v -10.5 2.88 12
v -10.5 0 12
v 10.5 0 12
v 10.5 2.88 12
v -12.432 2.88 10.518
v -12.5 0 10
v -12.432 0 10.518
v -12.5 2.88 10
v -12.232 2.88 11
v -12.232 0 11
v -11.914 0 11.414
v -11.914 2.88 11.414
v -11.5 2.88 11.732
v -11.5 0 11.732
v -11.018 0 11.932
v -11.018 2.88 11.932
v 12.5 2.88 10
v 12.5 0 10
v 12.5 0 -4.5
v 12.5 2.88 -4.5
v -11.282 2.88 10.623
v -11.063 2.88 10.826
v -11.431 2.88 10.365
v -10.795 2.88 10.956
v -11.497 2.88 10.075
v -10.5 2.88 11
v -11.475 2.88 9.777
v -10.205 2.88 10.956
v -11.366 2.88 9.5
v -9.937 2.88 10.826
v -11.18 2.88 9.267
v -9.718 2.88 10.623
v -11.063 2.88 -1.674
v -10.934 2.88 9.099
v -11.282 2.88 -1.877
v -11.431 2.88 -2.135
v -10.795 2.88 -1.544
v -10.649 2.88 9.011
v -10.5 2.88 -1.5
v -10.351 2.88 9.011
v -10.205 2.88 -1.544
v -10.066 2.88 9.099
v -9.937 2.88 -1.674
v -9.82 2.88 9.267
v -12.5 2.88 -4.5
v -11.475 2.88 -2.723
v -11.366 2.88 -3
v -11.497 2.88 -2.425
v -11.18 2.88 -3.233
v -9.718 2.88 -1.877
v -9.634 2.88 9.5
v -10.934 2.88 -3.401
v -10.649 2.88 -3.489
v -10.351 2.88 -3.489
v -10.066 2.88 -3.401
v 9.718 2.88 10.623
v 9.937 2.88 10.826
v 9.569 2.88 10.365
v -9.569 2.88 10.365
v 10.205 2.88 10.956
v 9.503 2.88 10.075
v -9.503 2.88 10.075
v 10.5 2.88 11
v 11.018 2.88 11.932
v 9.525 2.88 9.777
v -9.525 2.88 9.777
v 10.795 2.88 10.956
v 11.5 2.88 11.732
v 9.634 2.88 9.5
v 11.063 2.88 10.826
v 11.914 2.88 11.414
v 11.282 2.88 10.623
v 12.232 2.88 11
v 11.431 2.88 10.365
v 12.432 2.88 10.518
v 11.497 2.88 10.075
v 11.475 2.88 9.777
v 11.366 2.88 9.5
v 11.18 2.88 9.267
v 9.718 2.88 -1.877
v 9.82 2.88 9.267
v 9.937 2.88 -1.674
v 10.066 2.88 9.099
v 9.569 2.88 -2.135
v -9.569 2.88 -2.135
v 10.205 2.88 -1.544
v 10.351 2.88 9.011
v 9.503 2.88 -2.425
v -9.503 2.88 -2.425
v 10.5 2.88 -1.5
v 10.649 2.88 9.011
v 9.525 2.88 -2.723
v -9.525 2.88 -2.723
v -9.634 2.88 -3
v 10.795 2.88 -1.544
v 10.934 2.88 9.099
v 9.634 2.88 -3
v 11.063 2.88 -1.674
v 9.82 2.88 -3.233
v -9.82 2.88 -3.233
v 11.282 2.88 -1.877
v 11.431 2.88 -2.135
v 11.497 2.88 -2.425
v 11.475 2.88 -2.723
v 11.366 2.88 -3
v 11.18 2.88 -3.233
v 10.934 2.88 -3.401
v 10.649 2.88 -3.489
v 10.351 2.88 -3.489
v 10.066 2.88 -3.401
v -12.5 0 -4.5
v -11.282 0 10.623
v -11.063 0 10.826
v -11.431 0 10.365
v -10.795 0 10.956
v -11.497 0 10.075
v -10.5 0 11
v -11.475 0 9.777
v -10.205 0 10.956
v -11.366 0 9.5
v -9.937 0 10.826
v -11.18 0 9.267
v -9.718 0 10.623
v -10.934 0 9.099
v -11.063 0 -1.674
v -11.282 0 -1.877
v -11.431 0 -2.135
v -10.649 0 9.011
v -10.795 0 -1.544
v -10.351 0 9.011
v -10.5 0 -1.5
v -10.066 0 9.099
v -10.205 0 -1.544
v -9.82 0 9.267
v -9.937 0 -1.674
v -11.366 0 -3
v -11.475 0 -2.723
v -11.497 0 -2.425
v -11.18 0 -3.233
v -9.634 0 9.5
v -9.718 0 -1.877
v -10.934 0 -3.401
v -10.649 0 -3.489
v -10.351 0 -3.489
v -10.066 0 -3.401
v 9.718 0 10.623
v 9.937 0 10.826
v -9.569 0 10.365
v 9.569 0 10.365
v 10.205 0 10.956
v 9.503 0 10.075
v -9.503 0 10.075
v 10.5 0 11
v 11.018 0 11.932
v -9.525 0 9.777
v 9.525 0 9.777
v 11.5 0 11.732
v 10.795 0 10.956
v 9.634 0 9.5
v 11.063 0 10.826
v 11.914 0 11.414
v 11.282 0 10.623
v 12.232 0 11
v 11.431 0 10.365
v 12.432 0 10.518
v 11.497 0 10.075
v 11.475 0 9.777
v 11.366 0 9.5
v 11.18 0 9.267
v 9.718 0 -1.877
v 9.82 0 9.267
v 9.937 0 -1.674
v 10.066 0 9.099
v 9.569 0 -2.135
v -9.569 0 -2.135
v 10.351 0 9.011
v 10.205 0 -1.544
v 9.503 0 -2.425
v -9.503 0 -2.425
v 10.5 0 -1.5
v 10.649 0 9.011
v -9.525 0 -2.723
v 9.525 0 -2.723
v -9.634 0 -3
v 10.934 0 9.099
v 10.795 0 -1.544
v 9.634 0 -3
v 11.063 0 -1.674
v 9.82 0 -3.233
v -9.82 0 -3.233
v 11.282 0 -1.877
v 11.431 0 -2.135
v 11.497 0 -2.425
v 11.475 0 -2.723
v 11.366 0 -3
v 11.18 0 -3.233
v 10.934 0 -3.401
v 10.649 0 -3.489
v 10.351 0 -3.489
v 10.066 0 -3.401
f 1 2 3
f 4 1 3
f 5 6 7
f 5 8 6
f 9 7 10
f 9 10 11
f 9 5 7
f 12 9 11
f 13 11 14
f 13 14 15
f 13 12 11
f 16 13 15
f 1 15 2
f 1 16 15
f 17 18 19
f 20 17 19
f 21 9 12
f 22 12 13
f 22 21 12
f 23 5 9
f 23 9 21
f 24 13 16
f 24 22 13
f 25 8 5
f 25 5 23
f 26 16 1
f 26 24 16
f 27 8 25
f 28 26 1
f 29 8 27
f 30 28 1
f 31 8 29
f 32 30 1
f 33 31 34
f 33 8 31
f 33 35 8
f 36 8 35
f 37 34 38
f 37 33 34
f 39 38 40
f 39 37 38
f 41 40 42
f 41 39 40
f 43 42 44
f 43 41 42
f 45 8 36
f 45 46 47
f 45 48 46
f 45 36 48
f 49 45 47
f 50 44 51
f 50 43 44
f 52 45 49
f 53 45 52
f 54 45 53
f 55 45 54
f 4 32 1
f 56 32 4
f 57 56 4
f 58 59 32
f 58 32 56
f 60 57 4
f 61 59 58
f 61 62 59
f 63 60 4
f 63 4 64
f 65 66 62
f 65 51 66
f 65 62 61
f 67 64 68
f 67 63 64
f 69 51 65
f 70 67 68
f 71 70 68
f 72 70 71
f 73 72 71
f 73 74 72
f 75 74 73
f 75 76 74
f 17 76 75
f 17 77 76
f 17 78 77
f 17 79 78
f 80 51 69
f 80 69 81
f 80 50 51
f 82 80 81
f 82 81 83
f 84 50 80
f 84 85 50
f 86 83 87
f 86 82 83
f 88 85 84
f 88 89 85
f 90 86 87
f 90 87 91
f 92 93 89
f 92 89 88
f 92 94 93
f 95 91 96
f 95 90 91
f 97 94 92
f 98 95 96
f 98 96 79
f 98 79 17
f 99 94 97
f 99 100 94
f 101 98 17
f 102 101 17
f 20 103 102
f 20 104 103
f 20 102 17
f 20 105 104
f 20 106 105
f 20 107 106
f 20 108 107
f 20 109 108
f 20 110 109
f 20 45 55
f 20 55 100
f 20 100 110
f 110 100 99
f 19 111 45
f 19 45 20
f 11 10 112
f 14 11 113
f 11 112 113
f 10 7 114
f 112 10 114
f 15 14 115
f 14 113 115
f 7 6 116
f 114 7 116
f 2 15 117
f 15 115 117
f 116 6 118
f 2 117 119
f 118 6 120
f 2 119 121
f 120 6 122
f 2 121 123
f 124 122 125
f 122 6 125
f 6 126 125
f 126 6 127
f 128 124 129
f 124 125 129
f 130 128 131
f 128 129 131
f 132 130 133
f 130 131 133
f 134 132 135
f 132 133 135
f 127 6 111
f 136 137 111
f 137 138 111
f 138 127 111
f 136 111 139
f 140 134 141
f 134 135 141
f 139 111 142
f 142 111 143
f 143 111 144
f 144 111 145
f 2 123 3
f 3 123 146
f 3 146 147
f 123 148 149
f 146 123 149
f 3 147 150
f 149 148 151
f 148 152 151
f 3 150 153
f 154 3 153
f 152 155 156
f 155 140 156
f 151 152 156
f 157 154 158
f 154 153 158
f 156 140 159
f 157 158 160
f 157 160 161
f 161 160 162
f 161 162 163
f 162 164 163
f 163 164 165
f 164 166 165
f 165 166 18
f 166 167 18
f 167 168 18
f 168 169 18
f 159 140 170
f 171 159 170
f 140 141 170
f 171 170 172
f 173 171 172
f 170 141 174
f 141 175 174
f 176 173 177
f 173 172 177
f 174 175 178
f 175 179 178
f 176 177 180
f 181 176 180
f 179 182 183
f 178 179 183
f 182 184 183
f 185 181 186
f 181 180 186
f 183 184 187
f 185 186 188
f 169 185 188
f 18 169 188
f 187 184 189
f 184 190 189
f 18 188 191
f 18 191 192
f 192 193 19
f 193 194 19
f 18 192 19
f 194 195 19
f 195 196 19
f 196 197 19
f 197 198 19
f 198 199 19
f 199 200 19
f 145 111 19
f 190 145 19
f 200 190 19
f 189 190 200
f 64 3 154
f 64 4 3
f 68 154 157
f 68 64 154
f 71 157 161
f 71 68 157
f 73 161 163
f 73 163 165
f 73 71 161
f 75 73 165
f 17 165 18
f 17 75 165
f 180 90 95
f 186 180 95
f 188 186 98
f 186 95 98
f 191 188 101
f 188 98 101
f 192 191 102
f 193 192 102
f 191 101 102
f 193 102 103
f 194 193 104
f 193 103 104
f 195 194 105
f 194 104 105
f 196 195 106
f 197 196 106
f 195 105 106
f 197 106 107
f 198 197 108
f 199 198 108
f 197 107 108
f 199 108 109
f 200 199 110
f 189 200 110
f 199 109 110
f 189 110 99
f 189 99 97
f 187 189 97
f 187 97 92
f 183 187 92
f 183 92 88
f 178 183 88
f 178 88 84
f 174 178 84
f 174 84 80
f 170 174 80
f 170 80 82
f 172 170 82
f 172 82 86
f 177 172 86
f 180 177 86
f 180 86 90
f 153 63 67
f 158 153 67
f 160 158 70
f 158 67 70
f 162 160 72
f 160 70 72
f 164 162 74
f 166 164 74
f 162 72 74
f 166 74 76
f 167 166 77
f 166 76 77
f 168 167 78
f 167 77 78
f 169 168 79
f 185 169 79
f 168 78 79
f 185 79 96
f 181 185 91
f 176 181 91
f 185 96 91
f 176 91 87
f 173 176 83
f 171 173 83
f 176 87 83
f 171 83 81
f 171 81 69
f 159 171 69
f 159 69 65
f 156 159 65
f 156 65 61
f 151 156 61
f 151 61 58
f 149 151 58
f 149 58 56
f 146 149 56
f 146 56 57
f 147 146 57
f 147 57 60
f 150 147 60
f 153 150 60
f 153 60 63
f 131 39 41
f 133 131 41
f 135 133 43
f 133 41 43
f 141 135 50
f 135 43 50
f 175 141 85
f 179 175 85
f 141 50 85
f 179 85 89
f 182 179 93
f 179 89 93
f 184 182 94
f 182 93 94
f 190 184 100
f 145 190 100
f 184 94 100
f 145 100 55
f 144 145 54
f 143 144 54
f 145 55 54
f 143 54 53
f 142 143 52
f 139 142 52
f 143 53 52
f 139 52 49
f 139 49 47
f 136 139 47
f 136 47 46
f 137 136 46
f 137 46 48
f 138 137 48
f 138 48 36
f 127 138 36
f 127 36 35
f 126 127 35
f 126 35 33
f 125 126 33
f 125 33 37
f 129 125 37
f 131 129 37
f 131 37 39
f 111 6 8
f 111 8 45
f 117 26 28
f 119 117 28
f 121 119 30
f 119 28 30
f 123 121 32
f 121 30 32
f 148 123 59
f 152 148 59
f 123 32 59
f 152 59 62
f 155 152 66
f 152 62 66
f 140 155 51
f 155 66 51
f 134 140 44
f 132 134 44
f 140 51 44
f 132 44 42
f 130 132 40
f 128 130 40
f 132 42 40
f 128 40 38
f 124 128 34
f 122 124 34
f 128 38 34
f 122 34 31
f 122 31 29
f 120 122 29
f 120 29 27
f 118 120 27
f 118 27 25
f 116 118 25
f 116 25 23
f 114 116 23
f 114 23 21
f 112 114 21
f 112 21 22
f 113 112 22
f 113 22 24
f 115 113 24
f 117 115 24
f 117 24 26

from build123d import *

# Parameters (mm, degrees)
SKETCH1_W           = 25
SKETCH1_H           = 16.5
BOSS_EXTRUDE1_DEPTH = 2.88
SKETCH2_R           = 1
CUT_EXTRUDE1_DEPTH  = 18.565431962
FILLET1_R           = 2


with BuildPart() as part:
    # Sketch1 → Boss-Extrude1 (new body)
    with BuildSketch(Plane(origin=(0, 0, 0), x_dir=(1, 0, 0), z_dir=(0, 1, 0))):
        with Locations((0, -3.75)):
            Rectangle(SKETCH1_W, SKETCH1_H)
    extrude(amount=BOSS_EXTRUDE1_DEPTH)

    # Sketch2 → Cut-Extrude1 (cut, through all)
    with BuildSketch(Plane(origin=(0, 2.88, 0), x_dir=(1, 0, 0), z_dir=(0, 1, 0))):
        with Locations(Location((-10.5, 2.5, 0), (0, 0, 270))):
            Circle(SKETCH2_R)
        with Locations(Location((-10.5, -10, 0), (0, 0, 270))):
            Circle(SKETCH2_R)
        with Locations(Location((10.5, -10, 0), (0, 0, 270))):
            Circle(SKETCH2_R)
        with Locations(Location((10.5, 2.5, 0), (0, 0, 270))):
            Circle(SKETCH2_R)
    extrude(amount=-CUT_EXTRUDE1_DEPTH, mode=Mode.SUBTRACT)

    # Fillet1
    fillet1_edges = [part.edges().sort_by_distance(p)[0] for p in [
        (12.5, 1.44, 12),
        (-12.5, 1.44, 12),
    ]]
    fillet(fillet1_edges, radius=FILLET1_R)


solid = part.part
